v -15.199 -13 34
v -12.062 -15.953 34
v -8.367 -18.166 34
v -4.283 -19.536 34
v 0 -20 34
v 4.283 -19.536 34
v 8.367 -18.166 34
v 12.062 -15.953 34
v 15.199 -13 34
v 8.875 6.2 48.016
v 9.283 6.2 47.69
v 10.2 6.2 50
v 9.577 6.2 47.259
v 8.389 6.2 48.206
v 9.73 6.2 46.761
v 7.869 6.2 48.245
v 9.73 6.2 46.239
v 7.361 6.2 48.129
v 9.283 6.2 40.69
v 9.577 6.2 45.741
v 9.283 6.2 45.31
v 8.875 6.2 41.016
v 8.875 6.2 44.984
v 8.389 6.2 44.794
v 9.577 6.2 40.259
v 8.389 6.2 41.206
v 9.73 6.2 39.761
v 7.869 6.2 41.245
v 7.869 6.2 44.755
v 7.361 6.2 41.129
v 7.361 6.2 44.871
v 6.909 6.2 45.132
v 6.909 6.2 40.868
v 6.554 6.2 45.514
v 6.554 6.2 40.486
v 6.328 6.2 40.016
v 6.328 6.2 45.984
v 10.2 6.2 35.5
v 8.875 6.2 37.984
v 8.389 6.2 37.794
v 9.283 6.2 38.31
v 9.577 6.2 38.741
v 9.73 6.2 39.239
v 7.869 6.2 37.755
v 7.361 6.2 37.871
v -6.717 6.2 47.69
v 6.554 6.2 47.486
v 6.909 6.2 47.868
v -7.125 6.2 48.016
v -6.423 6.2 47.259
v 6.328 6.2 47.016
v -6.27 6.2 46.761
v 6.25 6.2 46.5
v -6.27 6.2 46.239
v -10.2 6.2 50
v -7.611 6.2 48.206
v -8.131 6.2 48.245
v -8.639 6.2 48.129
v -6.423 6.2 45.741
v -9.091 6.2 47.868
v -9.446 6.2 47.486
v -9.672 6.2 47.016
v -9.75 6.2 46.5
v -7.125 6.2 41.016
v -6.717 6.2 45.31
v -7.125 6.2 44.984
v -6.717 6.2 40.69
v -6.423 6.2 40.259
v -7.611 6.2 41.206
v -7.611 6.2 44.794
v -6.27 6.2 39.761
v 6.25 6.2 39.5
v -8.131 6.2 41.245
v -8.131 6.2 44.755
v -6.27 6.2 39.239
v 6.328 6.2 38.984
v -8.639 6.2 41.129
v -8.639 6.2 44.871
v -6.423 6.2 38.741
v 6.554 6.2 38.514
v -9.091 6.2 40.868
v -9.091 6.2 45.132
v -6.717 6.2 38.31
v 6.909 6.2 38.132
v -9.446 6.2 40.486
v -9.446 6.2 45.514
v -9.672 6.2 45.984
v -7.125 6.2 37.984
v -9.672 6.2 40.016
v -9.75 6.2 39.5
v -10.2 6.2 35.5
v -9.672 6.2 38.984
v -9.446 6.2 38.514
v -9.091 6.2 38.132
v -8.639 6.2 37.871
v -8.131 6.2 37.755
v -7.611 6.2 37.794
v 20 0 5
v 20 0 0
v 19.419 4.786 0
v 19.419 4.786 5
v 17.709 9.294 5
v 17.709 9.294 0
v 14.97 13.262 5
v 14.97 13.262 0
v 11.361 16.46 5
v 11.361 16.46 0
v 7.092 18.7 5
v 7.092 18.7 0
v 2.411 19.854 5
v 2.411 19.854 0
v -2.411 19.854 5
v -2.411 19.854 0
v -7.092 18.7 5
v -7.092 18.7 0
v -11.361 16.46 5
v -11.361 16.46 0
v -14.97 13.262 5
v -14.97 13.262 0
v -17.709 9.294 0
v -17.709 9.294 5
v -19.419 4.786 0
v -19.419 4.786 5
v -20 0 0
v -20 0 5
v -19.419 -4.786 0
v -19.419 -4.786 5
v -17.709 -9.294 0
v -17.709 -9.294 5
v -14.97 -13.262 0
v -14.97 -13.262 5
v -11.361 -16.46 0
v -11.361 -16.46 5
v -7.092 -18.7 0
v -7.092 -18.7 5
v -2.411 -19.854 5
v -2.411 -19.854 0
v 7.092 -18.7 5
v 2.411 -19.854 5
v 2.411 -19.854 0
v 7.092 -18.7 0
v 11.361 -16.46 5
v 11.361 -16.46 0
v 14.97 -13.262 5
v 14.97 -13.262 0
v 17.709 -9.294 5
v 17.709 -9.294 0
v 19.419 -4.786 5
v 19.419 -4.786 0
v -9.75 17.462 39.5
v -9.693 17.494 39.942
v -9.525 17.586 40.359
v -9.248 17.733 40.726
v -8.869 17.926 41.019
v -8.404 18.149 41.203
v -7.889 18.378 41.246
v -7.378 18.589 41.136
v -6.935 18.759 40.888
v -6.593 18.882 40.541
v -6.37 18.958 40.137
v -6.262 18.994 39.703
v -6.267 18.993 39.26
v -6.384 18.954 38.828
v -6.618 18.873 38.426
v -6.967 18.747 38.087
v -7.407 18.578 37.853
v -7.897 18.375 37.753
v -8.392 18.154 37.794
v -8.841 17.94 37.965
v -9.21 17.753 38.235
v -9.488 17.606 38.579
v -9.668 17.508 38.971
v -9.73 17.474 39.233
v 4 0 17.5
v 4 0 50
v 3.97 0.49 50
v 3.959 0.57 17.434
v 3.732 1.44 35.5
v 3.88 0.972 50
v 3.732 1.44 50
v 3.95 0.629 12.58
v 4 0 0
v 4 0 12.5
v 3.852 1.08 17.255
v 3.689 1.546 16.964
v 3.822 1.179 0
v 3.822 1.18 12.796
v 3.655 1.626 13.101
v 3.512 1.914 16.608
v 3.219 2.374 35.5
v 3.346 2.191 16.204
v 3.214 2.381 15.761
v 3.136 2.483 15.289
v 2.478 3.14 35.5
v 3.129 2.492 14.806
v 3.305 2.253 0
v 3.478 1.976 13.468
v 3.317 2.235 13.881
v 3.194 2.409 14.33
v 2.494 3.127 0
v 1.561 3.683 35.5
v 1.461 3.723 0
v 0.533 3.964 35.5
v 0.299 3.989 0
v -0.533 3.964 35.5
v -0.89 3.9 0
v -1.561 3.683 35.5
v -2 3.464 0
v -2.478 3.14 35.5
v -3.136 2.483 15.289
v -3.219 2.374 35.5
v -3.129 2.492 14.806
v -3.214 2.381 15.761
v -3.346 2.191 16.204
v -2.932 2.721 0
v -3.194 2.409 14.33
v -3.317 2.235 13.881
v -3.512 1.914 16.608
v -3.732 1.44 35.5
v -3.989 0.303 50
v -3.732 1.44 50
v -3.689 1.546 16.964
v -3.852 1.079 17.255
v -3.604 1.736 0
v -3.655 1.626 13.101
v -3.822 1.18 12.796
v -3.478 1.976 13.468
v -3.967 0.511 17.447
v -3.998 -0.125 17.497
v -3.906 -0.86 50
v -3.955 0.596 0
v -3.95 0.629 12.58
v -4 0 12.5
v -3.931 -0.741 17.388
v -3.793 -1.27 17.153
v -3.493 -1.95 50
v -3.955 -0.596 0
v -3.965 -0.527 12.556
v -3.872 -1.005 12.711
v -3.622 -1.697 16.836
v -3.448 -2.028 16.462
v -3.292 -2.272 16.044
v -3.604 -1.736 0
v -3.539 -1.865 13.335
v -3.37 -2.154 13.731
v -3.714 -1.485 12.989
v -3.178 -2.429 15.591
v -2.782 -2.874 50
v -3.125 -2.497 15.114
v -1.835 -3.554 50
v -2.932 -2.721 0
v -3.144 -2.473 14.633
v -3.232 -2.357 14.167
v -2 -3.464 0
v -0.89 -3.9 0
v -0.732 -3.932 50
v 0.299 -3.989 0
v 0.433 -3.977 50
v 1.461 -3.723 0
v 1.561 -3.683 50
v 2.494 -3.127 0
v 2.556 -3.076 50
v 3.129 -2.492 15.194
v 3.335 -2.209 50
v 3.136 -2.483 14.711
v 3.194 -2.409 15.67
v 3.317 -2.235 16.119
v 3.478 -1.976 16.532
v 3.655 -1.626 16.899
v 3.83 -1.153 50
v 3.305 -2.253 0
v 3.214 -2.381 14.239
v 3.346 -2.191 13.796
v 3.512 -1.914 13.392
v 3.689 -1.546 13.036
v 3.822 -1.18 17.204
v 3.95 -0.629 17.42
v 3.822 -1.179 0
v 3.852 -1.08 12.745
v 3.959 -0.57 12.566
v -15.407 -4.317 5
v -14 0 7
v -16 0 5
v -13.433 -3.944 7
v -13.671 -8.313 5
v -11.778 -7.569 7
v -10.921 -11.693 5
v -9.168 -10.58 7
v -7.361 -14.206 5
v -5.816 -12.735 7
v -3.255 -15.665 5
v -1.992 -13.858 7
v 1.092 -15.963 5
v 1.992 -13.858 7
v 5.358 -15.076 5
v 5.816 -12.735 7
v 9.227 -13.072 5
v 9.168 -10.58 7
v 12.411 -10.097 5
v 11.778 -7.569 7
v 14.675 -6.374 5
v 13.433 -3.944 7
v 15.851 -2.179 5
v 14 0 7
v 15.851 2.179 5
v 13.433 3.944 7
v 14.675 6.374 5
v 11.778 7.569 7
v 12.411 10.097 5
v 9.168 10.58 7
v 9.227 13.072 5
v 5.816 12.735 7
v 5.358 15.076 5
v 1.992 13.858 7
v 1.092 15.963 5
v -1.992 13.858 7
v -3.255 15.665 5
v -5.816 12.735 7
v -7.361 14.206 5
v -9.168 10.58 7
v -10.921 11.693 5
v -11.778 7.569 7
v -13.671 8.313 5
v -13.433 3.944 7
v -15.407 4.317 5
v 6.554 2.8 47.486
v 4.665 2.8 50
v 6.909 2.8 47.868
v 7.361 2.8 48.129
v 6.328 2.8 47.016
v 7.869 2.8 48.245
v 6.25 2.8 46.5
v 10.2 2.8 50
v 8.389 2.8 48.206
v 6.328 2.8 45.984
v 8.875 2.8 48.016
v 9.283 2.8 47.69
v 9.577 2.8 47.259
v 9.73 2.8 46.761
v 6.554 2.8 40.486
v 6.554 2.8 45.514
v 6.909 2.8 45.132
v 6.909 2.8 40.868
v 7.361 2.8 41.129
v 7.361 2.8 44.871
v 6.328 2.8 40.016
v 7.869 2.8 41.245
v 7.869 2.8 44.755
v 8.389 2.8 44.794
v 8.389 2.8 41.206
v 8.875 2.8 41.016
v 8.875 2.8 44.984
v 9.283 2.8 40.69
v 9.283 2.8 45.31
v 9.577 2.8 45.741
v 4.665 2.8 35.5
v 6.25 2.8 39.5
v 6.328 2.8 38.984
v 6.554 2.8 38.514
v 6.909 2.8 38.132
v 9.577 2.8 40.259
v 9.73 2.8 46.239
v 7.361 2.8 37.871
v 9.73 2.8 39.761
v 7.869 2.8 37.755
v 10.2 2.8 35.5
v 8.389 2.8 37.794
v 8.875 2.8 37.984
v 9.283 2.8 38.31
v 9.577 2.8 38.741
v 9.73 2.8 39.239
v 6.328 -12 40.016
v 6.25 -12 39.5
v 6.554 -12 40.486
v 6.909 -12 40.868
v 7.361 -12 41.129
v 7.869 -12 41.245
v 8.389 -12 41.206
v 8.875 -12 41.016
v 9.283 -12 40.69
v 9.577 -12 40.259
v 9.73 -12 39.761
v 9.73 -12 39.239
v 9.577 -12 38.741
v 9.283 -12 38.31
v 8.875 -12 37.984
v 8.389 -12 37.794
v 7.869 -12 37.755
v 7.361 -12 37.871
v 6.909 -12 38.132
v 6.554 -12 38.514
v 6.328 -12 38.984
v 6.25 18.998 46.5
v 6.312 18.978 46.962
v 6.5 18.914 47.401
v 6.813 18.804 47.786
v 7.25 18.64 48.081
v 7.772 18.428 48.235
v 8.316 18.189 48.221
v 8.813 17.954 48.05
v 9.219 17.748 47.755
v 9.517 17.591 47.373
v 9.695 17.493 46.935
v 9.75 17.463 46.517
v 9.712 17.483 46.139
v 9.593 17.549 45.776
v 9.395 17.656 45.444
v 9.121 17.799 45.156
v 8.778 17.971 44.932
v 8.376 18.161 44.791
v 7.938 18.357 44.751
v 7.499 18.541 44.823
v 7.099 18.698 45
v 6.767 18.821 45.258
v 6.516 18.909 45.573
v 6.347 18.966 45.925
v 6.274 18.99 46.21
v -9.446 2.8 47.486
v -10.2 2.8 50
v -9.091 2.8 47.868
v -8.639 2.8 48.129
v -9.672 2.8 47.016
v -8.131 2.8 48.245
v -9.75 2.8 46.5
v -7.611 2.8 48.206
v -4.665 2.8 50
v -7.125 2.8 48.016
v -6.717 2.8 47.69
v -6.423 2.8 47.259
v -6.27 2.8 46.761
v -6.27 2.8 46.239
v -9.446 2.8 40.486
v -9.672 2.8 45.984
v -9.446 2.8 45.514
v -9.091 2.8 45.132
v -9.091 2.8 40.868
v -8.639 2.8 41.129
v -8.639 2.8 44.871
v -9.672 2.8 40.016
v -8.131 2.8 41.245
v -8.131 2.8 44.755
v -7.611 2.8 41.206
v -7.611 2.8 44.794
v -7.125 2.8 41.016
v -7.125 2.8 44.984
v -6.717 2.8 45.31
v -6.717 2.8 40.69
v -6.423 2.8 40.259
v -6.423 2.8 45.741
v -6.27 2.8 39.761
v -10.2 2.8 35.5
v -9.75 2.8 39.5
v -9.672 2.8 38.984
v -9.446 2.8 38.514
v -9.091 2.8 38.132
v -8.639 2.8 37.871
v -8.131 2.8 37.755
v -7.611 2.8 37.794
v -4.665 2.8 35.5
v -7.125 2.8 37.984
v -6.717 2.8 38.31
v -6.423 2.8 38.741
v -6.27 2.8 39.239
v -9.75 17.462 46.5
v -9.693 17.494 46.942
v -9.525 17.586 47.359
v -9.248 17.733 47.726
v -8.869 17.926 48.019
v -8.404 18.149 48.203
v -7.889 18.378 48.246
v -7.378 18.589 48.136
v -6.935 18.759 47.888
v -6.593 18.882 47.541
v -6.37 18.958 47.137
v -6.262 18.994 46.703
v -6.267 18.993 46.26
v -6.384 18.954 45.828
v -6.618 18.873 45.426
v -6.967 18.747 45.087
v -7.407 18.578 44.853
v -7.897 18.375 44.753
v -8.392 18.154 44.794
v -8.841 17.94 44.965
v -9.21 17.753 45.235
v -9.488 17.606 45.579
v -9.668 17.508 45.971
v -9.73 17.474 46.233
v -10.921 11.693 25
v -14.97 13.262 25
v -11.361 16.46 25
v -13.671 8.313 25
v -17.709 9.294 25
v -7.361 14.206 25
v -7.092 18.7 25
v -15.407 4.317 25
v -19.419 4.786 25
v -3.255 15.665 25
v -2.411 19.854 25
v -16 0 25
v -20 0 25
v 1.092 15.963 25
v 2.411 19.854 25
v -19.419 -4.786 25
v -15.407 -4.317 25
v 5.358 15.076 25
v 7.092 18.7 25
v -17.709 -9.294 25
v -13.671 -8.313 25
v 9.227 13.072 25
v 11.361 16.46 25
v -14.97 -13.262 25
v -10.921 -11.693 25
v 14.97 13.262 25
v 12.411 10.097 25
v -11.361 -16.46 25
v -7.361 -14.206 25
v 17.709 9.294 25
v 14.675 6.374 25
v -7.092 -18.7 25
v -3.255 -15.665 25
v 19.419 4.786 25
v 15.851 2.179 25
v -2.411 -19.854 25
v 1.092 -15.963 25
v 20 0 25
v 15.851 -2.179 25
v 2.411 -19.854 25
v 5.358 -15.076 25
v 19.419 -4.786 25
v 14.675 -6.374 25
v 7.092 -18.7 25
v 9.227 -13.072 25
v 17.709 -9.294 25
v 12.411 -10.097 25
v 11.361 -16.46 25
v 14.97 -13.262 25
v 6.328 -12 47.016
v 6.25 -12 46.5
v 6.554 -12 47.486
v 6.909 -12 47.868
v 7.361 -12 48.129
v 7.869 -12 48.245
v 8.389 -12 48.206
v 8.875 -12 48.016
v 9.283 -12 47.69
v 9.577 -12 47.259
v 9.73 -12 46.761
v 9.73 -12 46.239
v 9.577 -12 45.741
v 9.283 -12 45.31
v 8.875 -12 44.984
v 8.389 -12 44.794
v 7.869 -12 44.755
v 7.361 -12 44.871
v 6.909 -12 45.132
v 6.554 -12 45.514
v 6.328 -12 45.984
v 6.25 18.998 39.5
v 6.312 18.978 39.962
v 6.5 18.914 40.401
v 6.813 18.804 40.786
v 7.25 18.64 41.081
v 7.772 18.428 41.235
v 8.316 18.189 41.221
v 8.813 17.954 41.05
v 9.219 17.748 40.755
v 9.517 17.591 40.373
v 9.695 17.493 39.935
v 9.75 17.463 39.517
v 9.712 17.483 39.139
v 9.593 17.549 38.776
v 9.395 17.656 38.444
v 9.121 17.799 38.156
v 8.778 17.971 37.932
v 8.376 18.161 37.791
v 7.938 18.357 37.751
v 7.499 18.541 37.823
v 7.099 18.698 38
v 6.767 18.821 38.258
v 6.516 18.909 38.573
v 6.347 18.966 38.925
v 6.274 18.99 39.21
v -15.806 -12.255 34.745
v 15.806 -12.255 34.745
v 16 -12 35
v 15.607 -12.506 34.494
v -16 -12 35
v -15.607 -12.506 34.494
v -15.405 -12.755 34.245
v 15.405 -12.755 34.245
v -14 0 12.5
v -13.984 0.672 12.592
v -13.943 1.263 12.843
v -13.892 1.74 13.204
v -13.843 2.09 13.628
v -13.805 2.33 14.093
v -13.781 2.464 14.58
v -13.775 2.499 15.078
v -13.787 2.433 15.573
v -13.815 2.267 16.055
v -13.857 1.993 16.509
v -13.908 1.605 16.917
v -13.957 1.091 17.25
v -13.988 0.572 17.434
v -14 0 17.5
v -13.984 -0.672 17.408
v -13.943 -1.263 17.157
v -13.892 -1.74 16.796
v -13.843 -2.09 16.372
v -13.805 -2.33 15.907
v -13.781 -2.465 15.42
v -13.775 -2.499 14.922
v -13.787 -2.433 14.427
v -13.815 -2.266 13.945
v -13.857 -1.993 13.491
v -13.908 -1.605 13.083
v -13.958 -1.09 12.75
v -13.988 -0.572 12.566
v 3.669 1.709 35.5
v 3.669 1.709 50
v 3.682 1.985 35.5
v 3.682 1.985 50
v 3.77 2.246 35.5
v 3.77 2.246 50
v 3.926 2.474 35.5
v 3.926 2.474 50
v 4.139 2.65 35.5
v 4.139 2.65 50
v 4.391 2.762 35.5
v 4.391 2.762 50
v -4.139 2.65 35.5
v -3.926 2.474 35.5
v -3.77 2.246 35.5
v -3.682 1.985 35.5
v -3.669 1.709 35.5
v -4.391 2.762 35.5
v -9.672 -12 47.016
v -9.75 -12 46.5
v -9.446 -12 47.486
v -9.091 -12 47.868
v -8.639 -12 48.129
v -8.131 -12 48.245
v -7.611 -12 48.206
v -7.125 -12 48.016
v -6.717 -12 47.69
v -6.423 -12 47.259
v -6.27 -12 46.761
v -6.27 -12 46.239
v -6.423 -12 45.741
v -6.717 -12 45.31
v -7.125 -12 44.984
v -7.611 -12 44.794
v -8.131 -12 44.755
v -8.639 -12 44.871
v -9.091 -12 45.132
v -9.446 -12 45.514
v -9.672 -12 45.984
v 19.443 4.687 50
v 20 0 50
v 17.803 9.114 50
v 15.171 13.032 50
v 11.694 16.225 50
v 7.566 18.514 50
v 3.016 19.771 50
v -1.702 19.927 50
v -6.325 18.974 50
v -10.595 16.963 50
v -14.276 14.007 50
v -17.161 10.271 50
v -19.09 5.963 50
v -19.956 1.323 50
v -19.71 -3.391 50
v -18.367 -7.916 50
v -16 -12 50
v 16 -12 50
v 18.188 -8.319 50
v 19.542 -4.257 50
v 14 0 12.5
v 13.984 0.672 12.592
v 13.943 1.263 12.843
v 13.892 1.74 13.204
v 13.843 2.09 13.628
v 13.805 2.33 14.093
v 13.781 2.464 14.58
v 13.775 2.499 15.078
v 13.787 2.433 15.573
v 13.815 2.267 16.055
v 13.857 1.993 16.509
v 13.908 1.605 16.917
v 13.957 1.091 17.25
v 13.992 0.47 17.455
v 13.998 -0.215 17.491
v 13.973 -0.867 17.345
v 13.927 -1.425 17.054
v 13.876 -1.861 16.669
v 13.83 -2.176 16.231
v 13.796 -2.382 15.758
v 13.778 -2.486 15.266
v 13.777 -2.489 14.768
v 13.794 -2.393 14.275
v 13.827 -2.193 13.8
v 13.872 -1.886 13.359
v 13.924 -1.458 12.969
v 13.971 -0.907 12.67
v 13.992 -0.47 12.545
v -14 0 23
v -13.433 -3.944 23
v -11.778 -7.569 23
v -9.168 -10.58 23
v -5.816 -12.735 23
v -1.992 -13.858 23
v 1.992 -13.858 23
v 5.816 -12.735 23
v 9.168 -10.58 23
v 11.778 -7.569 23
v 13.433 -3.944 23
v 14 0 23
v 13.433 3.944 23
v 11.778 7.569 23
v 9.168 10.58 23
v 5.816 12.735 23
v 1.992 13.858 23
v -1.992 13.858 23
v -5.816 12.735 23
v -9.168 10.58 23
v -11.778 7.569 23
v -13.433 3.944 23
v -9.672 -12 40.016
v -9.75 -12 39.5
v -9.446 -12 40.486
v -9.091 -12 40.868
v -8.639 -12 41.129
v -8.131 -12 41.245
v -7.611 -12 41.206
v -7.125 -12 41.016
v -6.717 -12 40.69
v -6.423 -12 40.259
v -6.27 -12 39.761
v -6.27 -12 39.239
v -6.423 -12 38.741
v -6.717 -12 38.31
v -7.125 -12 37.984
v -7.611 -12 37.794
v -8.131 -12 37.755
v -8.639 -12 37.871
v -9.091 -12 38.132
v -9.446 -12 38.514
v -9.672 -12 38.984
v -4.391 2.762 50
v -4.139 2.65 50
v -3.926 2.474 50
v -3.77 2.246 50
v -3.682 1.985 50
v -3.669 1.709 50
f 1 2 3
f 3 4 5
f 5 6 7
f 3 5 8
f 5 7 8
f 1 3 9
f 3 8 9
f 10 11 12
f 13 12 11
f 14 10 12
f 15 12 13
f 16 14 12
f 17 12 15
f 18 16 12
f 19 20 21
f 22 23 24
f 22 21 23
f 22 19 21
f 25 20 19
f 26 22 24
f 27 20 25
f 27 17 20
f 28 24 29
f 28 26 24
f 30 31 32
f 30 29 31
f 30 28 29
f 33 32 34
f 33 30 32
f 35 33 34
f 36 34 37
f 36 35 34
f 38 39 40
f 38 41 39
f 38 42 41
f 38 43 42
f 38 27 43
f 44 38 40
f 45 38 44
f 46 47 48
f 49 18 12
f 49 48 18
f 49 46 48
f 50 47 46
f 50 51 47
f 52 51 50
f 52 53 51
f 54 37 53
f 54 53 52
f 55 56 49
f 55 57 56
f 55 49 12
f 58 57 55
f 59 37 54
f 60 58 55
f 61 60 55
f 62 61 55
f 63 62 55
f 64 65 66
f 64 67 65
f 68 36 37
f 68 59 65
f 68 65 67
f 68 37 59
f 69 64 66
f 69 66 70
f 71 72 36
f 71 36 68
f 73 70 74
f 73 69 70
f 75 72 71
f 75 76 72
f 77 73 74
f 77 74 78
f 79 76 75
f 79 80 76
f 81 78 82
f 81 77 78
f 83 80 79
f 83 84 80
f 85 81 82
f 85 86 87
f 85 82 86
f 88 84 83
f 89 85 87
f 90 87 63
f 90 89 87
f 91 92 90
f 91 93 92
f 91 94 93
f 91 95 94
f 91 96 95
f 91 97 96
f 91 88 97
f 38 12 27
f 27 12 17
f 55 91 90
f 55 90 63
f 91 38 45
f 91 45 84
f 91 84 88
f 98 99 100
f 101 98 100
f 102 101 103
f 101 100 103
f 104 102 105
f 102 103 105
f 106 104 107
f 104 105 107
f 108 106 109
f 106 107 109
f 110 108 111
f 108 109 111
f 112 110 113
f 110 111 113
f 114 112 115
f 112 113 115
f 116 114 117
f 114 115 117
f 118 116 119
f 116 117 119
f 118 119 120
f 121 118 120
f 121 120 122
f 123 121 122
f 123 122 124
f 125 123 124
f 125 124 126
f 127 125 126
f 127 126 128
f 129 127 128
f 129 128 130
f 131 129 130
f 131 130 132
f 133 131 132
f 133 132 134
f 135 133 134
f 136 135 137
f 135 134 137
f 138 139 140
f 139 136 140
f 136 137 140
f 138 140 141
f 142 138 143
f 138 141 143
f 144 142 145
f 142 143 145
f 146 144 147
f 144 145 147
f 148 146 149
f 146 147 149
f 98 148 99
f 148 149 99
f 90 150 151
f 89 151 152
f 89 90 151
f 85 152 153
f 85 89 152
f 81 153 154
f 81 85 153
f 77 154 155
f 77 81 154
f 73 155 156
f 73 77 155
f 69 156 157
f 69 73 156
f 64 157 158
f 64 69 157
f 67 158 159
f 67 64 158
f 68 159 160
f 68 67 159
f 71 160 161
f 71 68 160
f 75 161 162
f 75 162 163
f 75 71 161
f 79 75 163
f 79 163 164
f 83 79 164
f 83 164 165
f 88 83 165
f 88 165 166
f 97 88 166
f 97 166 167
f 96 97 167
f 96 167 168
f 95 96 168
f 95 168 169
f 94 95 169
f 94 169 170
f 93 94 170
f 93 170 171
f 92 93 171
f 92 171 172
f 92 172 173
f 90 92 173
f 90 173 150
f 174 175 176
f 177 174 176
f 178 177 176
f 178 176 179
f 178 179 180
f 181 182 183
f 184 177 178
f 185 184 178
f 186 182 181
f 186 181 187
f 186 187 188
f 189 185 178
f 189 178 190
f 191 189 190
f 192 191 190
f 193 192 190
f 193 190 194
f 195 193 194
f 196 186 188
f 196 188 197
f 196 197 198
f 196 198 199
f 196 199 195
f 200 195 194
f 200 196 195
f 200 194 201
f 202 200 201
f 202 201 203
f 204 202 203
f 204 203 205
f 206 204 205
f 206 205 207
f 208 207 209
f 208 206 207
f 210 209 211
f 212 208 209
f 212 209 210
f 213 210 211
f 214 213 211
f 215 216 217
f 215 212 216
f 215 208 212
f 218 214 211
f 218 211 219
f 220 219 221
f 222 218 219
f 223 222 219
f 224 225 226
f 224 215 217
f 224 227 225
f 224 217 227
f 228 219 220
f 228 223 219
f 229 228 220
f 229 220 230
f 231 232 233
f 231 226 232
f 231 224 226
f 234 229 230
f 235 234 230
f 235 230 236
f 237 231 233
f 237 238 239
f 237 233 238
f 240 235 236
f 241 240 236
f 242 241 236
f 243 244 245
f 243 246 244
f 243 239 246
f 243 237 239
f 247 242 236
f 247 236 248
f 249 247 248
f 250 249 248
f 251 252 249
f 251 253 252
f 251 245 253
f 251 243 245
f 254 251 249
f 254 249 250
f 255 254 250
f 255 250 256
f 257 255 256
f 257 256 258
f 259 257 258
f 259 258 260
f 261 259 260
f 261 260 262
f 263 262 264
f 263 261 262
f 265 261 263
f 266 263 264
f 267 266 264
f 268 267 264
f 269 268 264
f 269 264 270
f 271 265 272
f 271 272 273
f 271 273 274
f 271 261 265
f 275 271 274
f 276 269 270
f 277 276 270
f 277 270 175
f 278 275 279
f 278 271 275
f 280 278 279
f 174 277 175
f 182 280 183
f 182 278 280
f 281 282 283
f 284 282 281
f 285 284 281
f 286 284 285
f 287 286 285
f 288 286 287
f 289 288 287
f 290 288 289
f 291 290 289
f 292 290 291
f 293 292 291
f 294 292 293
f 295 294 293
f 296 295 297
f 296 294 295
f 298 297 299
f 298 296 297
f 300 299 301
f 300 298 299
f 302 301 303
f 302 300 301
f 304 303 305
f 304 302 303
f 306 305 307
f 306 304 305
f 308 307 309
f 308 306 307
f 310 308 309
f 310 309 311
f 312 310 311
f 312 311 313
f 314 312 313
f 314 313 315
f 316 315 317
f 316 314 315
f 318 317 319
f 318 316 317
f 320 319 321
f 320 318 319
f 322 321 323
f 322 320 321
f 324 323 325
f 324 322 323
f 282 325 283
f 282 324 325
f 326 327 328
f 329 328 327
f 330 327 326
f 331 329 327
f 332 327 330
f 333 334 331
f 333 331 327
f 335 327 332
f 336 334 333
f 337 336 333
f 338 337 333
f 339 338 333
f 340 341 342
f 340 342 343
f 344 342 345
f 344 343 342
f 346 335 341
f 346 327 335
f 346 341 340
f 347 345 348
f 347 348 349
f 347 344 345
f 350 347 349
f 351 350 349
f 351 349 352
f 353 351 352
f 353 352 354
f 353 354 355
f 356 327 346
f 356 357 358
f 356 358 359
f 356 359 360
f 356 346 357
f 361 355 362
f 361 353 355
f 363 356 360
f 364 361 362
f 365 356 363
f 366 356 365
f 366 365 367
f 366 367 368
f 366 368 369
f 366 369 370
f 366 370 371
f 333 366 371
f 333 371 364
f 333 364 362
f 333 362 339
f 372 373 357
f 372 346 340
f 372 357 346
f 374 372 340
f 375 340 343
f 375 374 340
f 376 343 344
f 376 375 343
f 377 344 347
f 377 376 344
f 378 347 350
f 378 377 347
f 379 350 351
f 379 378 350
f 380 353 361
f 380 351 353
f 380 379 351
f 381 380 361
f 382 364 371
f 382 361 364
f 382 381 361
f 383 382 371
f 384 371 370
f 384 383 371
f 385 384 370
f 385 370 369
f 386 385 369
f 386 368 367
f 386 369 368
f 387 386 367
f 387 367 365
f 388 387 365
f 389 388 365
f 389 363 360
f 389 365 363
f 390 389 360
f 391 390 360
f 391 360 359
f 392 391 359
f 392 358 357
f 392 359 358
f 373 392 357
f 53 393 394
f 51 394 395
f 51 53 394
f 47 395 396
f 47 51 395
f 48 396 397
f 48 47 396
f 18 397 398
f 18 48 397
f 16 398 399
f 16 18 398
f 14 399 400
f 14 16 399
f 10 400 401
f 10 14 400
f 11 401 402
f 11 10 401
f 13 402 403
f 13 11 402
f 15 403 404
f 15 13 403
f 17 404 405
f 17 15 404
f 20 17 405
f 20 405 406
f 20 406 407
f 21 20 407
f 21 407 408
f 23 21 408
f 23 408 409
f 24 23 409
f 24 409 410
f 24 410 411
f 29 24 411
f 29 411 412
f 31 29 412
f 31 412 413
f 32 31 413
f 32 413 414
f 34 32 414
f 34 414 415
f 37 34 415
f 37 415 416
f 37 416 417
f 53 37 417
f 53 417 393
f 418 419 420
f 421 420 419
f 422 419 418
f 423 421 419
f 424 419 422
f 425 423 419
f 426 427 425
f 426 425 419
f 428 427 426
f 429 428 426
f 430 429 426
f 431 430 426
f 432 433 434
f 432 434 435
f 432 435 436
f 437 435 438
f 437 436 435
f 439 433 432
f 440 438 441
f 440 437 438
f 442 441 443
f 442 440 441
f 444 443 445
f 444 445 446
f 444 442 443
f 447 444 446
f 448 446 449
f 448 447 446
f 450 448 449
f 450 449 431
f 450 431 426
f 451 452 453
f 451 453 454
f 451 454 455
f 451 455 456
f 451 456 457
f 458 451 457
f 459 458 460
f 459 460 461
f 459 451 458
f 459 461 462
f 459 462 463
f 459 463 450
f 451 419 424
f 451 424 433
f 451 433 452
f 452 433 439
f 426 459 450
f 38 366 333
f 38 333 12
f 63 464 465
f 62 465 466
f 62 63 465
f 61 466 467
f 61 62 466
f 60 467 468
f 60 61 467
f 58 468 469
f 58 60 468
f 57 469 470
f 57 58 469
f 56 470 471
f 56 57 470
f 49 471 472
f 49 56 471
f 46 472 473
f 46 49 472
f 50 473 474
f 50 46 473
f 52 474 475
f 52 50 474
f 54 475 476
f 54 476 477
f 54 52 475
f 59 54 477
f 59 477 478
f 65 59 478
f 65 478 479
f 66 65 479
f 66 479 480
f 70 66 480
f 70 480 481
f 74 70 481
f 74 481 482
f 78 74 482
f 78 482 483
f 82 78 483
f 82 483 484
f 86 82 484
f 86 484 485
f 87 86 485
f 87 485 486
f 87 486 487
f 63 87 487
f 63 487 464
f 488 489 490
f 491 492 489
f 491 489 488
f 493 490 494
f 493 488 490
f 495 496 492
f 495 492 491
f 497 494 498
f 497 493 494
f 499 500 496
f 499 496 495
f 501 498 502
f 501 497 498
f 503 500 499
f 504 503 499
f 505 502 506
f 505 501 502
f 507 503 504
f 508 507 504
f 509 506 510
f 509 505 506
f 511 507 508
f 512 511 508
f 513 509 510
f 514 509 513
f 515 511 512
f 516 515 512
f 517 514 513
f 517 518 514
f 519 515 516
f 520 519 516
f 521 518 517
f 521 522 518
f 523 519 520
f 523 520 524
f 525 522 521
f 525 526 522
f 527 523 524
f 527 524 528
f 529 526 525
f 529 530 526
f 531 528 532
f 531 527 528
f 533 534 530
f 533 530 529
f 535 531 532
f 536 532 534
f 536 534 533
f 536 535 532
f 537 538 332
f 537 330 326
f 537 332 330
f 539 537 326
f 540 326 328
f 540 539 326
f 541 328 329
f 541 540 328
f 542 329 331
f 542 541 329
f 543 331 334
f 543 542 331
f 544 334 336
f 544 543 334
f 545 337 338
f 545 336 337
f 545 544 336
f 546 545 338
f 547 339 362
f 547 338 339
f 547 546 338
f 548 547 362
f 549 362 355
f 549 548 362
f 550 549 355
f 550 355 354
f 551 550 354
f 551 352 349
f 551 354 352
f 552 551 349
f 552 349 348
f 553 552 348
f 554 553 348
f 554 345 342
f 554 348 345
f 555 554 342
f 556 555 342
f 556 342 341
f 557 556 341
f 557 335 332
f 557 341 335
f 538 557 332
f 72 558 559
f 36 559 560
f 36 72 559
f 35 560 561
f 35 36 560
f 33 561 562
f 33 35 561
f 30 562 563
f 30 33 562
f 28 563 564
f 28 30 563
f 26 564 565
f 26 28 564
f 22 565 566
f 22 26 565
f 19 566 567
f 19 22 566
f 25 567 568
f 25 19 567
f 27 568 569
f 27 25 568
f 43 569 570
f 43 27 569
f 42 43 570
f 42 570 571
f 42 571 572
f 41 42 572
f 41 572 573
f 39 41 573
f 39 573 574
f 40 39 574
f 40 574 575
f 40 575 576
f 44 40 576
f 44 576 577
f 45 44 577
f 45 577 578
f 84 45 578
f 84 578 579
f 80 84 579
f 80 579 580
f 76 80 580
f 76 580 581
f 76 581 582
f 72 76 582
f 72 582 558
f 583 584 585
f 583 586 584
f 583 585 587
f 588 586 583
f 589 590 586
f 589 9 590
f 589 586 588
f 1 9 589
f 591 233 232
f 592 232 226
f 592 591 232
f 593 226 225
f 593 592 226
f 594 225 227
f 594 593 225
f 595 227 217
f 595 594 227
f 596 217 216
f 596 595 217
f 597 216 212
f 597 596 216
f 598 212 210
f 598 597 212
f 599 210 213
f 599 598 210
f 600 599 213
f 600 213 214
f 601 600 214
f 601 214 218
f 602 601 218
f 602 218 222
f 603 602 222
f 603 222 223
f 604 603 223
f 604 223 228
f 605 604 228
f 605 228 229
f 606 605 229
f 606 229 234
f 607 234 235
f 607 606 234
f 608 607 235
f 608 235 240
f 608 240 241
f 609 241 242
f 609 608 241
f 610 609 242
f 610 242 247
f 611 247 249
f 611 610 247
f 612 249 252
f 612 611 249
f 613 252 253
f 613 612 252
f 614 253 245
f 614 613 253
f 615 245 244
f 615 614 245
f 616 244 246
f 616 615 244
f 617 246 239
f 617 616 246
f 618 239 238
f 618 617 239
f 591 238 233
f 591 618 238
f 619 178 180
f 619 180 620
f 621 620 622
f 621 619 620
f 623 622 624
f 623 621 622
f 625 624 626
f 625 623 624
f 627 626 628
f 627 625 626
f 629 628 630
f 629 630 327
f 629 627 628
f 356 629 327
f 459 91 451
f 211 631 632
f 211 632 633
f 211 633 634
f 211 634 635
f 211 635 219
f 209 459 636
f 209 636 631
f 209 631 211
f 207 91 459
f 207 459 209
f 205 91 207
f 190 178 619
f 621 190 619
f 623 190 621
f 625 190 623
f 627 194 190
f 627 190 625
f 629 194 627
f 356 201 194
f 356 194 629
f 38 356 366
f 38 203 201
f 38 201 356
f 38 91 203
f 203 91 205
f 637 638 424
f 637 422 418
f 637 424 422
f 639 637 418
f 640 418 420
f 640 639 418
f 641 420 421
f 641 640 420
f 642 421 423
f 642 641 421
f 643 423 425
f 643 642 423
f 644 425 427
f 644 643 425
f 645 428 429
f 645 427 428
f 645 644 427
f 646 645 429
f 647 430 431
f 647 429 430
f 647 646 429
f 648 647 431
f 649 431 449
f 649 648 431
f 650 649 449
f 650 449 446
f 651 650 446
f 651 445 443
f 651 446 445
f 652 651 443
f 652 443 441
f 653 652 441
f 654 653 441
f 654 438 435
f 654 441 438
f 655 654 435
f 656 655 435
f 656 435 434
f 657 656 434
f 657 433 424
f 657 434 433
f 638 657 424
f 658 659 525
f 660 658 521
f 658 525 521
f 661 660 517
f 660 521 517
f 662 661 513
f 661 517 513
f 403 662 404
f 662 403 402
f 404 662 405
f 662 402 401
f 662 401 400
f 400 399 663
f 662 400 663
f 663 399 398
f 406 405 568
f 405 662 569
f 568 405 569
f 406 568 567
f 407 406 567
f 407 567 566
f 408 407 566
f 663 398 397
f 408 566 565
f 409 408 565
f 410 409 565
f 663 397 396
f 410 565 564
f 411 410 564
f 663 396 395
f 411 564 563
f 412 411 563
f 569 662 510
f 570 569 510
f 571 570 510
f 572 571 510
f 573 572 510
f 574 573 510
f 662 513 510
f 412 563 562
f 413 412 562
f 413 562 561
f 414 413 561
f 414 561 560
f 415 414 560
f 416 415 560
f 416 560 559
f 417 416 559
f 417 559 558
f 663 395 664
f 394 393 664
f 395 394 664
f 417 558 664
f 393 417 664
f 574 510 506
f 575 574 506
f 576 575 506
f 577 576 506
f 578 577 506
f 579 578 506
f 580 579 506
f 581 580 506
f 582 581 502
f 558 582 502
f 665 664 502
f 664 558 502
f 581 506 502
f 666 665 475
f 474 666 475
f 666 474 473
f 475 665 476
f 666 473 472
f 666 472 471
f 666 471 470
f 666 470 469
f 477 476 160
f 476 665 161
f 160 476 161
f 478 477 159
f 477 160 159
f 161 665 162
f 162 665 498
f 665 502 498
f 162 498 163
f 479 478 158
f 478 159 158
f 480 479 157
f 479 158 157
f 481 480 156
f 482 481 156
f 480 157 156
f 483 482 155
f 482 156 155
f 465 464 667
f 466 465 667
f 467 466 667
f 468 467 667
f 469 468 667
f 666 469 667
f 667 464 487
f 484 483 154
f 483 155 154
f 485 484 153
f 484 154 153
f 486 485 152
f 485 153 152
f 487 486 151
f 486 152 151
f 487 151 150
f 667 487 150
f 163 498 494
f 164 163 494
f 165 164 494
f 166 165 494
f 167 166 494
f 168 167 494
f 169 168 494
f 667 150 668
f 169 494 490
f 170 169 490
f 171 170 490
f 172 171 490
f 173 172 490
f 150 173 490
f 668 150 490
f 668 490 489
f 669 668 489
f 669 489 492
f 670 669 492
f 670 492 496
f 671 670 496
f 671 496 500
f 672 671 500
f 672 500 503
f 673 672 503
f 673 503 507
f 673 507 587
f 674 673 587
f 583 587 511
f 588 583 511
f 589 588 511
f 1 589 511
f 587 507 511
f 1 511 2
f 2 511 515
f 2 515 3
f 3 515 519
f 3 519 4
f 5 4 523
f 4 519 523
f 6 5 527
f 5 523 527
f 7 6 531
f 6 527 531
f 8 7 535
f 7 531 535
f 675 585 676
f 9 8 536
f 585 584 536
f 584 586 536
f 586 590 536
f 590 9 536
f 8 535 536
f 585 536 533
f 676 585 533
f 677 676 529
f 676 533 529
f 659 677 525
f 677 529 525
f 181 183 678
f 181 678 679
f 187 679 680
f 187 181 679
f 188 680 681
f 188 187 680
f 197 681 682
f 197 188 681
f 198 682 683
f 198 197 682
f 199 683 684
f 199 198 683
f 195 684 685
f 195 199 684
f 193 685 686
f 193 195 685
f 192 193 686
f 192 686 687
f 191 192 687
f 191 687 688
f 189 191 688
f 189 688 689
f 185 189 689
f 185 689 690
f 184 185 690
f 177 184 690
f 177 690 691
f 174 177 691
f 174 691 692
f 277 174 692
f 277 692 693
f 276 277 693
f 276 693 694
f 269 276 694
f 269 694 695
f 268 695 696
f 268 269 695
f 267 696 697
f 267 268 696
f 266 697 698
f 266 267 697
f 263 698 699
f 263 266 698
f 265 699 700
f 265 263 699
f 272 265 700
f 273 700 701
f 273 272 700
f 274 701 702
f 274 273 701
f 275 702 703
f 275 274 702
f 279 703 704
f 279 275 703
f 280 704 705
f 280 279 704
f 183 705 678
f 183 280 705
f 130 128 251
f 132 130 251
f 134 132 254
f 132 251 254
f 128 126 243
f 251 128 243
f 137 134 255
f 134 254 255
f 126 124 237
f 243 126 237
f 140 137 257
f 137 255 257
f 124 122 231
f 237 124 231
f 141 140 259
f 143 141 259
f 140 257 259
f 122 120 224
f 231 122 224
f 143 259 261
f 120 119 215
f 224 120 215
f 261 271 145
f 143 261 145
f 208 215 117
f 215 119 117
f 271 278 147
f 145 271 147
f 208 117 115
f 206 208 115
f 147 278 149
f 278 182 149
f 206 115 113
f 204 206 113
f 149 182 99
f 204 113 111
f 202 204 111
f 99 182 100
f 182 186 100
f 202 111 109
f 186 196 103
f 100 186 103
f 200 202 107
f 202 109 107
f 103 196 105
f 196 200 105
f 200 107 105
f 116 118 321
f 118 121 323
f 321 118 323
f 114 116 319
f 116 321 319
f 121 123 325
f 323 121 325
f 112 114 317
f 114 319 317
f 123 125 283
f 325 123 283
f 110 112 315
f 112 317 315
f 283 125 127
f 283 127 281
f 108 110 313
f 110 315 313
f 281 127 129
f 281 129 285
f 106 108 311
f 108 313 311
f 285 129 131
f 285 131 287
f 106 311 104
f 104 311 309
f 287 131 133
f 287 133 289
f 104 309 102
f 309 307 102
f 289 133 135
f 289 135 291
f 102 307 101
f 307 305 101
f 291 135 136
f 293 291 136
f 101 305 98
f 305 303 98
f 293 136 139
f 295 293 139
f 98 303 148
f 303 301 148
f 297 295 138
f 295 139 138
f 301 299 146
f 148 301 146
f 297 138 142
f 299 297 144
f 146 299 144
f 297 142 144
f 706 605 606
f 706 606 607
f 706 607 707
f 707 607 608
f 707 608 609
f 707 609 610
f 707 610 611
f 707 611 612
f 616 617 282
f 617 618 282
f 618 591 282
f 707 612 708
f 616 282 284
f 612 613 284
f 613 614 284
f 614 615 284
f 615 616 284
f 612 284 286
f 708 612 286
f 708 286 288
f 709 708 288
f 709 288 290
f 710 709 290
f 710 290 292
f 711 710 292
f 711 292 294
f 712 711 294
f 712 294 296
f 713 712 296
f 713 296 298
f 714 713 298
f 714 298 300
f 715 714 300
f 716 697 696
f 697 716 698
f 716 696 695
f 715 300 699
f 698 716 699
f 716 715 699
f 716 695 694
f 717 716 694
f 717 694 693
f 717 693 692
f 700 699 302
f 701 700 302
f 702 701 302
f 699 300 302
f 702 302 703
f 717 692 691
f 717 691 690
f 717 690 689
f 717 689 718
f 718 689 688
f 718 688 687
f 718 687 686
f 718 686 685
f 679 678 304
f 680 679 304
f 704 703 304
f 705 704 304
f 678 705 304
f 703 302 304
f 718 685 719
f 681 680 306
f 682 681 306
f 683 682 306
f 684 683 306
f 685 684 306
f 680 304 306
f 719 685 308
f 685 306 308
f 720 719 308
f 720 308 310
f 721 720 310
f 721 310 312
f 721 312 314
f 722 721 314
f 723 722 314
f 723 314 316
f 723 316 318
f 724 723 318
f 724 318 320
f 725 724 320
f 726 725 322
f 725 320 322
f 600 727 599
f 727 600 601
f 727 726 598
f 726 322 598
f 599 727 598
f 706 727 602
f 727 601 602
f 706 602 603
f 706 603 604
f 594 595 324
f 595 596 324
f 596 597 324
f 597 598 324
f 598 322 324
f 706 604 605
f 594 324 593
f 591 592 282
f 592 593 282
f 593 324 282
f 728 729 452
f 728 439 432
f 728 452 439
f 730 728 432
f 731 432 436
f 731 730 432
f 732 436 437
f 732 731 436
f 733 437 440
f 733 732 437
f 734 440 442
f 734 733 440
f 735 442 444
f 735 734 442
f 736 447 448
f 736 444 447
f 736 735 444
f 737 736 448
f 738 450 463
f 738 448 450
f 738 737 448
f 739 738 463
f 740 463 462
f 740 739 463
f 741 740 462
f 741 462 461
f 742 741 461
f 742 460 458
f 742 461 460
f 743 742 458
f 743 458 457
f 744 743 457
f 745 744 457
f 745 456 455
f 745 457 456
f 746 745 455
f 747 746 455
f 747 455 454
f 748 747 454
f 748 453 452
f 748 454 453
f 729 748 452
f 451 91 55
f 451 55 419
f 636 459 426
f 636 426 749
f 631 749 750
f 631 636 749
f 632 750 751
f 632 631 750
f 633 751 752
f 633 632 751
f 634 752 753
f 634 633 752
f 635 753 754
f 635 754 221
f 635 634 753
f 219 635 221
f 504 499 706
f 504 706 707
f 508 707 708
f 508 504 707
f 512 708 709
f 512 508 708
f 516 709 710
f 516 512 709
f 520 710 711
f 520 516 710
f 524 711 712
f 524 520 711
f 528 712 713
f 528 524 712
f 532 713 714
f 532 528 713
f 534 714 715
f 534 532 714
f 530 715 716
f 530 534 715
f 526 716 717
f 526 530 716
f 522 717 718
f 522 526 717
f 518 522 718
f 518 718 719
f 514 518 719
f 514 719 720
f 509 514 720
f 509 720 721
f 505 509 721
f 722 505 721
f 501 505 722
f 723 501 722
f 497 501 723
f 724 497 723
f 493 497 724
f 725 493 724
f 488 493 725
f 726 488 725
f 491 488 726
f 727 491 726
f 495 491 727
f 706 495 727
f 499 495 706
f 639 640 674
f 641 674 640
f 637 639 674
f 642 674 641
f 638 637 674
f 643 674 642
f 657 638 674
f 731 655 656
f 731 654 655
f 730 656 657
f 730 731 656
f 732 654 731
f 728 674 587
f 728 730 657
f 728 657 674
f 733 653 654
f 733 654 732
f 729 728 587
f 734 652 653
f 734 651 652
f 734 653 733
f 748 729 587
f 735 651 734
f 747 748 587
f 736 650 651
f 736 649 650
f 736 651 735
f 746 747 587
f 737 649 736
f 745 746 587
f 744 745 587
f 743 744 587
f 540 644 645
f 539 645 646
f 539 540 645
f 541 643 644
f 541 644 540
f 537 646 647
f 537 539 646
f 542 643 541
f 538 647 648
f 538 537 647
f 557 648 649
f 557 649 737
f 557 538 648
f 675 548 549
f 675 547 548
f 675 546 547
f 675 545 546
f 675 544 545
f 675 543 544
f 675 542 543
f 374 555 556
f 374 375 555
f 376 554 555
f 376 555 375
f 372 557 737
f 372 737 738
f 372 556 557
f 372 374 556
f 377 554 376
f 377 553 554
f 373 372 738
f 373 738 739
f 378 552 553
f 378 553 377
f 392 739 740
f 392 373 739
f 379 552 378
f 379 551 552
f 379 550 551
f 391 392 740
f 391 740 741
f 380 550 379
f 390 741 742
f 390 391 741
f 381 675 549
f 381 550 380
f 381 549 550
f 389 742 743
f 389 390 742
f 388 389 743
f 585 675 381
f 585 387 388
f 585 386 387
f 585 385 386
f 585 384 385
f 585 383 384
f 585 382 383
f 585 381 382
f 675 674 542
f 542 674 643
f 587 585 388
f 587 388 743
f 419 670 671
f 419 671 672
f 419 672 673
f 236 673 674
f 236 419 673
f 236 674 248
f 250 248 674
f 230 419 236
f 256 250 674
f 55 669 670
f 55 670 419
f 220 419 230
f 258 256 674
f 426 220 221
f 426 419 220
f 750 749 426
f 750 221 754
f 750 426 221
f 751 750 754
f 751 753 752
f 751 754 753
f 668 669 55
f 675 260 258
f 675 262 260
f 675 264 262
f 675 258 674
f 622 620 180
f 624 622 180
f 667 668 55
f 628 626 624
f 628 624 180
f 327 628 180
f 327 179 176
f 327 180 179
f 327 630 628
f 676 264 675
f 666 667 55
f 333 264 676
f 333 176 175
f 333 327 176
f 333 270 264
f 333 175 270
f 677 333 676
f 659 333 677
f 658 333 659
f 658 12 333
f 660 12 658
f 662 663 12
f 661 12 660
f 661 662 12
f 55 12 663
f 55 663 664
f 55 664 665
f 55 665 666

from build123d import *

# Parameters (mm, degrees)
SZKIC1_R                        = 20
SZKIC1_R_2                      = 4
DODANIE_WYCI_GNI_CIE1_DEPTH     = 50
WYTNIJ_WYCI_GNI_CIE1_START      = -14.5
WYTNIJ_WYCI_GNI_CIE1_DEPTH      = 14.5
WYTNIJ_WYCI_GNI_CIE2_DEPTH      = 59.479398082
WYTNIJ_WYCI_GNI_CIE2_DEPTH_BACK = 59.479398082
SZKIC3_R                        = 1.75
SZKIC4_W                        = 16
SZKIC4_H                        = 8
WYTNIJ_WYCI_GNI_CIE3_DEPTH      = 68.082039489
SZKIC6_W                        = 20
SZKIC6_H                        = 6
SFAZOWANIE1_SIZE                = 2
WYTNIJ_WYCI_GNI_CIE4_DEPTH      = 58.445626622
WYTNIJ_WYCI_GNI_CIE4_DEPTH_BACK = 58.445626622
SZKIC7_R                        = 2.5
SFAZOWANIE2_SIZE                = 1


with BuildPart() as part:
    # Szkic1 → Dodanie-wyciągnięcie1 (new body)
    with BuildSketch(Plane.XY):
        Circle(SZKIC1_R)
        Circle(SZKIC1_R_2, mode=Mode.SUBTRACT)
    extrude(amount=DODANIE_WYCI_GNI_CIE1_DEPTH)

    # Szkic2 → Wytnij-wyciągnięcie1 (cut)
    with BuildSketch(Plane.XY.offset(50).offset(WYTNIJ_WYCI_GNI_CIE1_START)):
        with BuildLine():
            Line((4.664761516, 2.8), (10.2, 2.8))
            Line((10.2, 2.8), (10.2, 6.2))
            Line((10.2, 6.2), (-10.2, 6.2))
            Line((-10.2, 6.2), (-10.2, 2.8))
            Line((-10.2, 2.8), (-4.664761516, 2.8))
            ThreePointArc((-4.664761516, 2.8), (-3.840140391, 2.365685425), (-3.731809213, 1.44))
            ThreePointArc((-3.731809213, 1.44), (0, -4), (3.731809213, 1.44))
            ThreePointArc((3.731809213, 1.44), (3.840140391, 2.365685425), (4.664761516, 2.8))
        make_face()
    extrude(amount=WYTNIJ_WYCI_GNI_CIE1_DEPTH, mode=Mode.SUBTRACT)

    # Szkic3 → Wytnij-wyciągnięcie2 (cut, two sides: drawn at the far end of the back side and taken through both)
    with BuildSketch(Plane(origin=(0, 2.8, 0), x_dir=(1, 0, 0), z_dir=(0, 1, 0)).offset(-WYTNIJ_WYCI_GNI_CIE2_DEPTH_BACK)):
        with Locations(Location((-8, -46.5, 0), (0, 0, 180))):
            Circle(SZKIC3_R)
        with Locations(Location((-8, -39.5, 0), (0, 0, 180))):
            Circle(SZKIC3_R)
        with Locations(Location((8, -46.5, 0), (0, 0, 180))):
            Circle(SZKIC3_R)
        with Locations(Location((8, -39.5, 0), (0, 0, 180))):
            Circle(SZKIC3_R)
    extrude(amount=WYTNIJ_WYCI_GNI_CIE2_DEPTH + WYTNIJ_WYCI_GNI_CIE2_DEPTH_BACK, mode=Mode.SUBTRACT)

    # Szkic4 → Wytnij-wyciągnięcie3 (cut, through all)
    with BuildSketch(Plane(origin=(20, 0, 0), x_dir=(0, 0, -1), z_dir=(1, 0, 0))):
        with Locations((-42, -16)):
            Rectangle(SZKIC4_W, SZKIC4_H)
    extrude(amount=-WYTNIJ_WYCI_GNI_CIE3_DEPTH, mode=Mode.SUBTRACT)

    # Szkic6 → Wycięcie-obrót1 (revolve, cut)
    with BuildSketch(Plane(origin=(0, 0, 0), x_dir=(0, 0, -1), z_dir=(1, 0, 0)), mode=Mode.PRIVATE) as wyci_cie_obr_t1_sk:
        with Locations((-15, 17)):
            Rectangle(SZKIC6_W, SZKIC6_H)
    revolve(wyci_cie_obr_t1_sk.sketch.rotate(Axis((0, 0, 0), (0, 0, 1)), 90), axis=Axis((0, 0, 0), (0, 0, 1)), mode=Mode.SUBTRACT)

    # Sfazowanie1
    sfazowanie1_edges = [part.edges().sort_by_distance(p)[0] for p in [
        (14, 0, 25),
        (14, 0, 5),
    ]]
    chamfer(sfazowanie1_edges, length=SFAZOWANIE1_SIZE)

    # Szkic7 → Wytnij-wyciągnięcie4 (cut, two sides: drawn at the far end of the back side and taken through both)
    with BuildSketch(Plane(origin=(0, 0, 0), x_dir=(0, 0, -1), z_dir=(1, 0, 0)).offset(-WYTNIJ_WYCI_GNI_CIE4_DEPTH_BACK)):
        with Locations((-15, 0)):
            Circle(SZKIC7_R)
    extrude(amount=WYTNIJ_WYCI_GNI_CIE4_DEPTH + WYTNIJ_WYCI_GNI_CIE4_DEPTH_BACK, mode=Mode.SUBTRACT)

    # Sfazowanie2
    sfazowanie2_edges = [part.edges().sort_by_distance(p)[0] for p in [
        (0, -12, 34),
    ]]
    chamfer(sfazowanie2_edges, length=SFAZOWANIE2_SIZE)


solid = part.part
